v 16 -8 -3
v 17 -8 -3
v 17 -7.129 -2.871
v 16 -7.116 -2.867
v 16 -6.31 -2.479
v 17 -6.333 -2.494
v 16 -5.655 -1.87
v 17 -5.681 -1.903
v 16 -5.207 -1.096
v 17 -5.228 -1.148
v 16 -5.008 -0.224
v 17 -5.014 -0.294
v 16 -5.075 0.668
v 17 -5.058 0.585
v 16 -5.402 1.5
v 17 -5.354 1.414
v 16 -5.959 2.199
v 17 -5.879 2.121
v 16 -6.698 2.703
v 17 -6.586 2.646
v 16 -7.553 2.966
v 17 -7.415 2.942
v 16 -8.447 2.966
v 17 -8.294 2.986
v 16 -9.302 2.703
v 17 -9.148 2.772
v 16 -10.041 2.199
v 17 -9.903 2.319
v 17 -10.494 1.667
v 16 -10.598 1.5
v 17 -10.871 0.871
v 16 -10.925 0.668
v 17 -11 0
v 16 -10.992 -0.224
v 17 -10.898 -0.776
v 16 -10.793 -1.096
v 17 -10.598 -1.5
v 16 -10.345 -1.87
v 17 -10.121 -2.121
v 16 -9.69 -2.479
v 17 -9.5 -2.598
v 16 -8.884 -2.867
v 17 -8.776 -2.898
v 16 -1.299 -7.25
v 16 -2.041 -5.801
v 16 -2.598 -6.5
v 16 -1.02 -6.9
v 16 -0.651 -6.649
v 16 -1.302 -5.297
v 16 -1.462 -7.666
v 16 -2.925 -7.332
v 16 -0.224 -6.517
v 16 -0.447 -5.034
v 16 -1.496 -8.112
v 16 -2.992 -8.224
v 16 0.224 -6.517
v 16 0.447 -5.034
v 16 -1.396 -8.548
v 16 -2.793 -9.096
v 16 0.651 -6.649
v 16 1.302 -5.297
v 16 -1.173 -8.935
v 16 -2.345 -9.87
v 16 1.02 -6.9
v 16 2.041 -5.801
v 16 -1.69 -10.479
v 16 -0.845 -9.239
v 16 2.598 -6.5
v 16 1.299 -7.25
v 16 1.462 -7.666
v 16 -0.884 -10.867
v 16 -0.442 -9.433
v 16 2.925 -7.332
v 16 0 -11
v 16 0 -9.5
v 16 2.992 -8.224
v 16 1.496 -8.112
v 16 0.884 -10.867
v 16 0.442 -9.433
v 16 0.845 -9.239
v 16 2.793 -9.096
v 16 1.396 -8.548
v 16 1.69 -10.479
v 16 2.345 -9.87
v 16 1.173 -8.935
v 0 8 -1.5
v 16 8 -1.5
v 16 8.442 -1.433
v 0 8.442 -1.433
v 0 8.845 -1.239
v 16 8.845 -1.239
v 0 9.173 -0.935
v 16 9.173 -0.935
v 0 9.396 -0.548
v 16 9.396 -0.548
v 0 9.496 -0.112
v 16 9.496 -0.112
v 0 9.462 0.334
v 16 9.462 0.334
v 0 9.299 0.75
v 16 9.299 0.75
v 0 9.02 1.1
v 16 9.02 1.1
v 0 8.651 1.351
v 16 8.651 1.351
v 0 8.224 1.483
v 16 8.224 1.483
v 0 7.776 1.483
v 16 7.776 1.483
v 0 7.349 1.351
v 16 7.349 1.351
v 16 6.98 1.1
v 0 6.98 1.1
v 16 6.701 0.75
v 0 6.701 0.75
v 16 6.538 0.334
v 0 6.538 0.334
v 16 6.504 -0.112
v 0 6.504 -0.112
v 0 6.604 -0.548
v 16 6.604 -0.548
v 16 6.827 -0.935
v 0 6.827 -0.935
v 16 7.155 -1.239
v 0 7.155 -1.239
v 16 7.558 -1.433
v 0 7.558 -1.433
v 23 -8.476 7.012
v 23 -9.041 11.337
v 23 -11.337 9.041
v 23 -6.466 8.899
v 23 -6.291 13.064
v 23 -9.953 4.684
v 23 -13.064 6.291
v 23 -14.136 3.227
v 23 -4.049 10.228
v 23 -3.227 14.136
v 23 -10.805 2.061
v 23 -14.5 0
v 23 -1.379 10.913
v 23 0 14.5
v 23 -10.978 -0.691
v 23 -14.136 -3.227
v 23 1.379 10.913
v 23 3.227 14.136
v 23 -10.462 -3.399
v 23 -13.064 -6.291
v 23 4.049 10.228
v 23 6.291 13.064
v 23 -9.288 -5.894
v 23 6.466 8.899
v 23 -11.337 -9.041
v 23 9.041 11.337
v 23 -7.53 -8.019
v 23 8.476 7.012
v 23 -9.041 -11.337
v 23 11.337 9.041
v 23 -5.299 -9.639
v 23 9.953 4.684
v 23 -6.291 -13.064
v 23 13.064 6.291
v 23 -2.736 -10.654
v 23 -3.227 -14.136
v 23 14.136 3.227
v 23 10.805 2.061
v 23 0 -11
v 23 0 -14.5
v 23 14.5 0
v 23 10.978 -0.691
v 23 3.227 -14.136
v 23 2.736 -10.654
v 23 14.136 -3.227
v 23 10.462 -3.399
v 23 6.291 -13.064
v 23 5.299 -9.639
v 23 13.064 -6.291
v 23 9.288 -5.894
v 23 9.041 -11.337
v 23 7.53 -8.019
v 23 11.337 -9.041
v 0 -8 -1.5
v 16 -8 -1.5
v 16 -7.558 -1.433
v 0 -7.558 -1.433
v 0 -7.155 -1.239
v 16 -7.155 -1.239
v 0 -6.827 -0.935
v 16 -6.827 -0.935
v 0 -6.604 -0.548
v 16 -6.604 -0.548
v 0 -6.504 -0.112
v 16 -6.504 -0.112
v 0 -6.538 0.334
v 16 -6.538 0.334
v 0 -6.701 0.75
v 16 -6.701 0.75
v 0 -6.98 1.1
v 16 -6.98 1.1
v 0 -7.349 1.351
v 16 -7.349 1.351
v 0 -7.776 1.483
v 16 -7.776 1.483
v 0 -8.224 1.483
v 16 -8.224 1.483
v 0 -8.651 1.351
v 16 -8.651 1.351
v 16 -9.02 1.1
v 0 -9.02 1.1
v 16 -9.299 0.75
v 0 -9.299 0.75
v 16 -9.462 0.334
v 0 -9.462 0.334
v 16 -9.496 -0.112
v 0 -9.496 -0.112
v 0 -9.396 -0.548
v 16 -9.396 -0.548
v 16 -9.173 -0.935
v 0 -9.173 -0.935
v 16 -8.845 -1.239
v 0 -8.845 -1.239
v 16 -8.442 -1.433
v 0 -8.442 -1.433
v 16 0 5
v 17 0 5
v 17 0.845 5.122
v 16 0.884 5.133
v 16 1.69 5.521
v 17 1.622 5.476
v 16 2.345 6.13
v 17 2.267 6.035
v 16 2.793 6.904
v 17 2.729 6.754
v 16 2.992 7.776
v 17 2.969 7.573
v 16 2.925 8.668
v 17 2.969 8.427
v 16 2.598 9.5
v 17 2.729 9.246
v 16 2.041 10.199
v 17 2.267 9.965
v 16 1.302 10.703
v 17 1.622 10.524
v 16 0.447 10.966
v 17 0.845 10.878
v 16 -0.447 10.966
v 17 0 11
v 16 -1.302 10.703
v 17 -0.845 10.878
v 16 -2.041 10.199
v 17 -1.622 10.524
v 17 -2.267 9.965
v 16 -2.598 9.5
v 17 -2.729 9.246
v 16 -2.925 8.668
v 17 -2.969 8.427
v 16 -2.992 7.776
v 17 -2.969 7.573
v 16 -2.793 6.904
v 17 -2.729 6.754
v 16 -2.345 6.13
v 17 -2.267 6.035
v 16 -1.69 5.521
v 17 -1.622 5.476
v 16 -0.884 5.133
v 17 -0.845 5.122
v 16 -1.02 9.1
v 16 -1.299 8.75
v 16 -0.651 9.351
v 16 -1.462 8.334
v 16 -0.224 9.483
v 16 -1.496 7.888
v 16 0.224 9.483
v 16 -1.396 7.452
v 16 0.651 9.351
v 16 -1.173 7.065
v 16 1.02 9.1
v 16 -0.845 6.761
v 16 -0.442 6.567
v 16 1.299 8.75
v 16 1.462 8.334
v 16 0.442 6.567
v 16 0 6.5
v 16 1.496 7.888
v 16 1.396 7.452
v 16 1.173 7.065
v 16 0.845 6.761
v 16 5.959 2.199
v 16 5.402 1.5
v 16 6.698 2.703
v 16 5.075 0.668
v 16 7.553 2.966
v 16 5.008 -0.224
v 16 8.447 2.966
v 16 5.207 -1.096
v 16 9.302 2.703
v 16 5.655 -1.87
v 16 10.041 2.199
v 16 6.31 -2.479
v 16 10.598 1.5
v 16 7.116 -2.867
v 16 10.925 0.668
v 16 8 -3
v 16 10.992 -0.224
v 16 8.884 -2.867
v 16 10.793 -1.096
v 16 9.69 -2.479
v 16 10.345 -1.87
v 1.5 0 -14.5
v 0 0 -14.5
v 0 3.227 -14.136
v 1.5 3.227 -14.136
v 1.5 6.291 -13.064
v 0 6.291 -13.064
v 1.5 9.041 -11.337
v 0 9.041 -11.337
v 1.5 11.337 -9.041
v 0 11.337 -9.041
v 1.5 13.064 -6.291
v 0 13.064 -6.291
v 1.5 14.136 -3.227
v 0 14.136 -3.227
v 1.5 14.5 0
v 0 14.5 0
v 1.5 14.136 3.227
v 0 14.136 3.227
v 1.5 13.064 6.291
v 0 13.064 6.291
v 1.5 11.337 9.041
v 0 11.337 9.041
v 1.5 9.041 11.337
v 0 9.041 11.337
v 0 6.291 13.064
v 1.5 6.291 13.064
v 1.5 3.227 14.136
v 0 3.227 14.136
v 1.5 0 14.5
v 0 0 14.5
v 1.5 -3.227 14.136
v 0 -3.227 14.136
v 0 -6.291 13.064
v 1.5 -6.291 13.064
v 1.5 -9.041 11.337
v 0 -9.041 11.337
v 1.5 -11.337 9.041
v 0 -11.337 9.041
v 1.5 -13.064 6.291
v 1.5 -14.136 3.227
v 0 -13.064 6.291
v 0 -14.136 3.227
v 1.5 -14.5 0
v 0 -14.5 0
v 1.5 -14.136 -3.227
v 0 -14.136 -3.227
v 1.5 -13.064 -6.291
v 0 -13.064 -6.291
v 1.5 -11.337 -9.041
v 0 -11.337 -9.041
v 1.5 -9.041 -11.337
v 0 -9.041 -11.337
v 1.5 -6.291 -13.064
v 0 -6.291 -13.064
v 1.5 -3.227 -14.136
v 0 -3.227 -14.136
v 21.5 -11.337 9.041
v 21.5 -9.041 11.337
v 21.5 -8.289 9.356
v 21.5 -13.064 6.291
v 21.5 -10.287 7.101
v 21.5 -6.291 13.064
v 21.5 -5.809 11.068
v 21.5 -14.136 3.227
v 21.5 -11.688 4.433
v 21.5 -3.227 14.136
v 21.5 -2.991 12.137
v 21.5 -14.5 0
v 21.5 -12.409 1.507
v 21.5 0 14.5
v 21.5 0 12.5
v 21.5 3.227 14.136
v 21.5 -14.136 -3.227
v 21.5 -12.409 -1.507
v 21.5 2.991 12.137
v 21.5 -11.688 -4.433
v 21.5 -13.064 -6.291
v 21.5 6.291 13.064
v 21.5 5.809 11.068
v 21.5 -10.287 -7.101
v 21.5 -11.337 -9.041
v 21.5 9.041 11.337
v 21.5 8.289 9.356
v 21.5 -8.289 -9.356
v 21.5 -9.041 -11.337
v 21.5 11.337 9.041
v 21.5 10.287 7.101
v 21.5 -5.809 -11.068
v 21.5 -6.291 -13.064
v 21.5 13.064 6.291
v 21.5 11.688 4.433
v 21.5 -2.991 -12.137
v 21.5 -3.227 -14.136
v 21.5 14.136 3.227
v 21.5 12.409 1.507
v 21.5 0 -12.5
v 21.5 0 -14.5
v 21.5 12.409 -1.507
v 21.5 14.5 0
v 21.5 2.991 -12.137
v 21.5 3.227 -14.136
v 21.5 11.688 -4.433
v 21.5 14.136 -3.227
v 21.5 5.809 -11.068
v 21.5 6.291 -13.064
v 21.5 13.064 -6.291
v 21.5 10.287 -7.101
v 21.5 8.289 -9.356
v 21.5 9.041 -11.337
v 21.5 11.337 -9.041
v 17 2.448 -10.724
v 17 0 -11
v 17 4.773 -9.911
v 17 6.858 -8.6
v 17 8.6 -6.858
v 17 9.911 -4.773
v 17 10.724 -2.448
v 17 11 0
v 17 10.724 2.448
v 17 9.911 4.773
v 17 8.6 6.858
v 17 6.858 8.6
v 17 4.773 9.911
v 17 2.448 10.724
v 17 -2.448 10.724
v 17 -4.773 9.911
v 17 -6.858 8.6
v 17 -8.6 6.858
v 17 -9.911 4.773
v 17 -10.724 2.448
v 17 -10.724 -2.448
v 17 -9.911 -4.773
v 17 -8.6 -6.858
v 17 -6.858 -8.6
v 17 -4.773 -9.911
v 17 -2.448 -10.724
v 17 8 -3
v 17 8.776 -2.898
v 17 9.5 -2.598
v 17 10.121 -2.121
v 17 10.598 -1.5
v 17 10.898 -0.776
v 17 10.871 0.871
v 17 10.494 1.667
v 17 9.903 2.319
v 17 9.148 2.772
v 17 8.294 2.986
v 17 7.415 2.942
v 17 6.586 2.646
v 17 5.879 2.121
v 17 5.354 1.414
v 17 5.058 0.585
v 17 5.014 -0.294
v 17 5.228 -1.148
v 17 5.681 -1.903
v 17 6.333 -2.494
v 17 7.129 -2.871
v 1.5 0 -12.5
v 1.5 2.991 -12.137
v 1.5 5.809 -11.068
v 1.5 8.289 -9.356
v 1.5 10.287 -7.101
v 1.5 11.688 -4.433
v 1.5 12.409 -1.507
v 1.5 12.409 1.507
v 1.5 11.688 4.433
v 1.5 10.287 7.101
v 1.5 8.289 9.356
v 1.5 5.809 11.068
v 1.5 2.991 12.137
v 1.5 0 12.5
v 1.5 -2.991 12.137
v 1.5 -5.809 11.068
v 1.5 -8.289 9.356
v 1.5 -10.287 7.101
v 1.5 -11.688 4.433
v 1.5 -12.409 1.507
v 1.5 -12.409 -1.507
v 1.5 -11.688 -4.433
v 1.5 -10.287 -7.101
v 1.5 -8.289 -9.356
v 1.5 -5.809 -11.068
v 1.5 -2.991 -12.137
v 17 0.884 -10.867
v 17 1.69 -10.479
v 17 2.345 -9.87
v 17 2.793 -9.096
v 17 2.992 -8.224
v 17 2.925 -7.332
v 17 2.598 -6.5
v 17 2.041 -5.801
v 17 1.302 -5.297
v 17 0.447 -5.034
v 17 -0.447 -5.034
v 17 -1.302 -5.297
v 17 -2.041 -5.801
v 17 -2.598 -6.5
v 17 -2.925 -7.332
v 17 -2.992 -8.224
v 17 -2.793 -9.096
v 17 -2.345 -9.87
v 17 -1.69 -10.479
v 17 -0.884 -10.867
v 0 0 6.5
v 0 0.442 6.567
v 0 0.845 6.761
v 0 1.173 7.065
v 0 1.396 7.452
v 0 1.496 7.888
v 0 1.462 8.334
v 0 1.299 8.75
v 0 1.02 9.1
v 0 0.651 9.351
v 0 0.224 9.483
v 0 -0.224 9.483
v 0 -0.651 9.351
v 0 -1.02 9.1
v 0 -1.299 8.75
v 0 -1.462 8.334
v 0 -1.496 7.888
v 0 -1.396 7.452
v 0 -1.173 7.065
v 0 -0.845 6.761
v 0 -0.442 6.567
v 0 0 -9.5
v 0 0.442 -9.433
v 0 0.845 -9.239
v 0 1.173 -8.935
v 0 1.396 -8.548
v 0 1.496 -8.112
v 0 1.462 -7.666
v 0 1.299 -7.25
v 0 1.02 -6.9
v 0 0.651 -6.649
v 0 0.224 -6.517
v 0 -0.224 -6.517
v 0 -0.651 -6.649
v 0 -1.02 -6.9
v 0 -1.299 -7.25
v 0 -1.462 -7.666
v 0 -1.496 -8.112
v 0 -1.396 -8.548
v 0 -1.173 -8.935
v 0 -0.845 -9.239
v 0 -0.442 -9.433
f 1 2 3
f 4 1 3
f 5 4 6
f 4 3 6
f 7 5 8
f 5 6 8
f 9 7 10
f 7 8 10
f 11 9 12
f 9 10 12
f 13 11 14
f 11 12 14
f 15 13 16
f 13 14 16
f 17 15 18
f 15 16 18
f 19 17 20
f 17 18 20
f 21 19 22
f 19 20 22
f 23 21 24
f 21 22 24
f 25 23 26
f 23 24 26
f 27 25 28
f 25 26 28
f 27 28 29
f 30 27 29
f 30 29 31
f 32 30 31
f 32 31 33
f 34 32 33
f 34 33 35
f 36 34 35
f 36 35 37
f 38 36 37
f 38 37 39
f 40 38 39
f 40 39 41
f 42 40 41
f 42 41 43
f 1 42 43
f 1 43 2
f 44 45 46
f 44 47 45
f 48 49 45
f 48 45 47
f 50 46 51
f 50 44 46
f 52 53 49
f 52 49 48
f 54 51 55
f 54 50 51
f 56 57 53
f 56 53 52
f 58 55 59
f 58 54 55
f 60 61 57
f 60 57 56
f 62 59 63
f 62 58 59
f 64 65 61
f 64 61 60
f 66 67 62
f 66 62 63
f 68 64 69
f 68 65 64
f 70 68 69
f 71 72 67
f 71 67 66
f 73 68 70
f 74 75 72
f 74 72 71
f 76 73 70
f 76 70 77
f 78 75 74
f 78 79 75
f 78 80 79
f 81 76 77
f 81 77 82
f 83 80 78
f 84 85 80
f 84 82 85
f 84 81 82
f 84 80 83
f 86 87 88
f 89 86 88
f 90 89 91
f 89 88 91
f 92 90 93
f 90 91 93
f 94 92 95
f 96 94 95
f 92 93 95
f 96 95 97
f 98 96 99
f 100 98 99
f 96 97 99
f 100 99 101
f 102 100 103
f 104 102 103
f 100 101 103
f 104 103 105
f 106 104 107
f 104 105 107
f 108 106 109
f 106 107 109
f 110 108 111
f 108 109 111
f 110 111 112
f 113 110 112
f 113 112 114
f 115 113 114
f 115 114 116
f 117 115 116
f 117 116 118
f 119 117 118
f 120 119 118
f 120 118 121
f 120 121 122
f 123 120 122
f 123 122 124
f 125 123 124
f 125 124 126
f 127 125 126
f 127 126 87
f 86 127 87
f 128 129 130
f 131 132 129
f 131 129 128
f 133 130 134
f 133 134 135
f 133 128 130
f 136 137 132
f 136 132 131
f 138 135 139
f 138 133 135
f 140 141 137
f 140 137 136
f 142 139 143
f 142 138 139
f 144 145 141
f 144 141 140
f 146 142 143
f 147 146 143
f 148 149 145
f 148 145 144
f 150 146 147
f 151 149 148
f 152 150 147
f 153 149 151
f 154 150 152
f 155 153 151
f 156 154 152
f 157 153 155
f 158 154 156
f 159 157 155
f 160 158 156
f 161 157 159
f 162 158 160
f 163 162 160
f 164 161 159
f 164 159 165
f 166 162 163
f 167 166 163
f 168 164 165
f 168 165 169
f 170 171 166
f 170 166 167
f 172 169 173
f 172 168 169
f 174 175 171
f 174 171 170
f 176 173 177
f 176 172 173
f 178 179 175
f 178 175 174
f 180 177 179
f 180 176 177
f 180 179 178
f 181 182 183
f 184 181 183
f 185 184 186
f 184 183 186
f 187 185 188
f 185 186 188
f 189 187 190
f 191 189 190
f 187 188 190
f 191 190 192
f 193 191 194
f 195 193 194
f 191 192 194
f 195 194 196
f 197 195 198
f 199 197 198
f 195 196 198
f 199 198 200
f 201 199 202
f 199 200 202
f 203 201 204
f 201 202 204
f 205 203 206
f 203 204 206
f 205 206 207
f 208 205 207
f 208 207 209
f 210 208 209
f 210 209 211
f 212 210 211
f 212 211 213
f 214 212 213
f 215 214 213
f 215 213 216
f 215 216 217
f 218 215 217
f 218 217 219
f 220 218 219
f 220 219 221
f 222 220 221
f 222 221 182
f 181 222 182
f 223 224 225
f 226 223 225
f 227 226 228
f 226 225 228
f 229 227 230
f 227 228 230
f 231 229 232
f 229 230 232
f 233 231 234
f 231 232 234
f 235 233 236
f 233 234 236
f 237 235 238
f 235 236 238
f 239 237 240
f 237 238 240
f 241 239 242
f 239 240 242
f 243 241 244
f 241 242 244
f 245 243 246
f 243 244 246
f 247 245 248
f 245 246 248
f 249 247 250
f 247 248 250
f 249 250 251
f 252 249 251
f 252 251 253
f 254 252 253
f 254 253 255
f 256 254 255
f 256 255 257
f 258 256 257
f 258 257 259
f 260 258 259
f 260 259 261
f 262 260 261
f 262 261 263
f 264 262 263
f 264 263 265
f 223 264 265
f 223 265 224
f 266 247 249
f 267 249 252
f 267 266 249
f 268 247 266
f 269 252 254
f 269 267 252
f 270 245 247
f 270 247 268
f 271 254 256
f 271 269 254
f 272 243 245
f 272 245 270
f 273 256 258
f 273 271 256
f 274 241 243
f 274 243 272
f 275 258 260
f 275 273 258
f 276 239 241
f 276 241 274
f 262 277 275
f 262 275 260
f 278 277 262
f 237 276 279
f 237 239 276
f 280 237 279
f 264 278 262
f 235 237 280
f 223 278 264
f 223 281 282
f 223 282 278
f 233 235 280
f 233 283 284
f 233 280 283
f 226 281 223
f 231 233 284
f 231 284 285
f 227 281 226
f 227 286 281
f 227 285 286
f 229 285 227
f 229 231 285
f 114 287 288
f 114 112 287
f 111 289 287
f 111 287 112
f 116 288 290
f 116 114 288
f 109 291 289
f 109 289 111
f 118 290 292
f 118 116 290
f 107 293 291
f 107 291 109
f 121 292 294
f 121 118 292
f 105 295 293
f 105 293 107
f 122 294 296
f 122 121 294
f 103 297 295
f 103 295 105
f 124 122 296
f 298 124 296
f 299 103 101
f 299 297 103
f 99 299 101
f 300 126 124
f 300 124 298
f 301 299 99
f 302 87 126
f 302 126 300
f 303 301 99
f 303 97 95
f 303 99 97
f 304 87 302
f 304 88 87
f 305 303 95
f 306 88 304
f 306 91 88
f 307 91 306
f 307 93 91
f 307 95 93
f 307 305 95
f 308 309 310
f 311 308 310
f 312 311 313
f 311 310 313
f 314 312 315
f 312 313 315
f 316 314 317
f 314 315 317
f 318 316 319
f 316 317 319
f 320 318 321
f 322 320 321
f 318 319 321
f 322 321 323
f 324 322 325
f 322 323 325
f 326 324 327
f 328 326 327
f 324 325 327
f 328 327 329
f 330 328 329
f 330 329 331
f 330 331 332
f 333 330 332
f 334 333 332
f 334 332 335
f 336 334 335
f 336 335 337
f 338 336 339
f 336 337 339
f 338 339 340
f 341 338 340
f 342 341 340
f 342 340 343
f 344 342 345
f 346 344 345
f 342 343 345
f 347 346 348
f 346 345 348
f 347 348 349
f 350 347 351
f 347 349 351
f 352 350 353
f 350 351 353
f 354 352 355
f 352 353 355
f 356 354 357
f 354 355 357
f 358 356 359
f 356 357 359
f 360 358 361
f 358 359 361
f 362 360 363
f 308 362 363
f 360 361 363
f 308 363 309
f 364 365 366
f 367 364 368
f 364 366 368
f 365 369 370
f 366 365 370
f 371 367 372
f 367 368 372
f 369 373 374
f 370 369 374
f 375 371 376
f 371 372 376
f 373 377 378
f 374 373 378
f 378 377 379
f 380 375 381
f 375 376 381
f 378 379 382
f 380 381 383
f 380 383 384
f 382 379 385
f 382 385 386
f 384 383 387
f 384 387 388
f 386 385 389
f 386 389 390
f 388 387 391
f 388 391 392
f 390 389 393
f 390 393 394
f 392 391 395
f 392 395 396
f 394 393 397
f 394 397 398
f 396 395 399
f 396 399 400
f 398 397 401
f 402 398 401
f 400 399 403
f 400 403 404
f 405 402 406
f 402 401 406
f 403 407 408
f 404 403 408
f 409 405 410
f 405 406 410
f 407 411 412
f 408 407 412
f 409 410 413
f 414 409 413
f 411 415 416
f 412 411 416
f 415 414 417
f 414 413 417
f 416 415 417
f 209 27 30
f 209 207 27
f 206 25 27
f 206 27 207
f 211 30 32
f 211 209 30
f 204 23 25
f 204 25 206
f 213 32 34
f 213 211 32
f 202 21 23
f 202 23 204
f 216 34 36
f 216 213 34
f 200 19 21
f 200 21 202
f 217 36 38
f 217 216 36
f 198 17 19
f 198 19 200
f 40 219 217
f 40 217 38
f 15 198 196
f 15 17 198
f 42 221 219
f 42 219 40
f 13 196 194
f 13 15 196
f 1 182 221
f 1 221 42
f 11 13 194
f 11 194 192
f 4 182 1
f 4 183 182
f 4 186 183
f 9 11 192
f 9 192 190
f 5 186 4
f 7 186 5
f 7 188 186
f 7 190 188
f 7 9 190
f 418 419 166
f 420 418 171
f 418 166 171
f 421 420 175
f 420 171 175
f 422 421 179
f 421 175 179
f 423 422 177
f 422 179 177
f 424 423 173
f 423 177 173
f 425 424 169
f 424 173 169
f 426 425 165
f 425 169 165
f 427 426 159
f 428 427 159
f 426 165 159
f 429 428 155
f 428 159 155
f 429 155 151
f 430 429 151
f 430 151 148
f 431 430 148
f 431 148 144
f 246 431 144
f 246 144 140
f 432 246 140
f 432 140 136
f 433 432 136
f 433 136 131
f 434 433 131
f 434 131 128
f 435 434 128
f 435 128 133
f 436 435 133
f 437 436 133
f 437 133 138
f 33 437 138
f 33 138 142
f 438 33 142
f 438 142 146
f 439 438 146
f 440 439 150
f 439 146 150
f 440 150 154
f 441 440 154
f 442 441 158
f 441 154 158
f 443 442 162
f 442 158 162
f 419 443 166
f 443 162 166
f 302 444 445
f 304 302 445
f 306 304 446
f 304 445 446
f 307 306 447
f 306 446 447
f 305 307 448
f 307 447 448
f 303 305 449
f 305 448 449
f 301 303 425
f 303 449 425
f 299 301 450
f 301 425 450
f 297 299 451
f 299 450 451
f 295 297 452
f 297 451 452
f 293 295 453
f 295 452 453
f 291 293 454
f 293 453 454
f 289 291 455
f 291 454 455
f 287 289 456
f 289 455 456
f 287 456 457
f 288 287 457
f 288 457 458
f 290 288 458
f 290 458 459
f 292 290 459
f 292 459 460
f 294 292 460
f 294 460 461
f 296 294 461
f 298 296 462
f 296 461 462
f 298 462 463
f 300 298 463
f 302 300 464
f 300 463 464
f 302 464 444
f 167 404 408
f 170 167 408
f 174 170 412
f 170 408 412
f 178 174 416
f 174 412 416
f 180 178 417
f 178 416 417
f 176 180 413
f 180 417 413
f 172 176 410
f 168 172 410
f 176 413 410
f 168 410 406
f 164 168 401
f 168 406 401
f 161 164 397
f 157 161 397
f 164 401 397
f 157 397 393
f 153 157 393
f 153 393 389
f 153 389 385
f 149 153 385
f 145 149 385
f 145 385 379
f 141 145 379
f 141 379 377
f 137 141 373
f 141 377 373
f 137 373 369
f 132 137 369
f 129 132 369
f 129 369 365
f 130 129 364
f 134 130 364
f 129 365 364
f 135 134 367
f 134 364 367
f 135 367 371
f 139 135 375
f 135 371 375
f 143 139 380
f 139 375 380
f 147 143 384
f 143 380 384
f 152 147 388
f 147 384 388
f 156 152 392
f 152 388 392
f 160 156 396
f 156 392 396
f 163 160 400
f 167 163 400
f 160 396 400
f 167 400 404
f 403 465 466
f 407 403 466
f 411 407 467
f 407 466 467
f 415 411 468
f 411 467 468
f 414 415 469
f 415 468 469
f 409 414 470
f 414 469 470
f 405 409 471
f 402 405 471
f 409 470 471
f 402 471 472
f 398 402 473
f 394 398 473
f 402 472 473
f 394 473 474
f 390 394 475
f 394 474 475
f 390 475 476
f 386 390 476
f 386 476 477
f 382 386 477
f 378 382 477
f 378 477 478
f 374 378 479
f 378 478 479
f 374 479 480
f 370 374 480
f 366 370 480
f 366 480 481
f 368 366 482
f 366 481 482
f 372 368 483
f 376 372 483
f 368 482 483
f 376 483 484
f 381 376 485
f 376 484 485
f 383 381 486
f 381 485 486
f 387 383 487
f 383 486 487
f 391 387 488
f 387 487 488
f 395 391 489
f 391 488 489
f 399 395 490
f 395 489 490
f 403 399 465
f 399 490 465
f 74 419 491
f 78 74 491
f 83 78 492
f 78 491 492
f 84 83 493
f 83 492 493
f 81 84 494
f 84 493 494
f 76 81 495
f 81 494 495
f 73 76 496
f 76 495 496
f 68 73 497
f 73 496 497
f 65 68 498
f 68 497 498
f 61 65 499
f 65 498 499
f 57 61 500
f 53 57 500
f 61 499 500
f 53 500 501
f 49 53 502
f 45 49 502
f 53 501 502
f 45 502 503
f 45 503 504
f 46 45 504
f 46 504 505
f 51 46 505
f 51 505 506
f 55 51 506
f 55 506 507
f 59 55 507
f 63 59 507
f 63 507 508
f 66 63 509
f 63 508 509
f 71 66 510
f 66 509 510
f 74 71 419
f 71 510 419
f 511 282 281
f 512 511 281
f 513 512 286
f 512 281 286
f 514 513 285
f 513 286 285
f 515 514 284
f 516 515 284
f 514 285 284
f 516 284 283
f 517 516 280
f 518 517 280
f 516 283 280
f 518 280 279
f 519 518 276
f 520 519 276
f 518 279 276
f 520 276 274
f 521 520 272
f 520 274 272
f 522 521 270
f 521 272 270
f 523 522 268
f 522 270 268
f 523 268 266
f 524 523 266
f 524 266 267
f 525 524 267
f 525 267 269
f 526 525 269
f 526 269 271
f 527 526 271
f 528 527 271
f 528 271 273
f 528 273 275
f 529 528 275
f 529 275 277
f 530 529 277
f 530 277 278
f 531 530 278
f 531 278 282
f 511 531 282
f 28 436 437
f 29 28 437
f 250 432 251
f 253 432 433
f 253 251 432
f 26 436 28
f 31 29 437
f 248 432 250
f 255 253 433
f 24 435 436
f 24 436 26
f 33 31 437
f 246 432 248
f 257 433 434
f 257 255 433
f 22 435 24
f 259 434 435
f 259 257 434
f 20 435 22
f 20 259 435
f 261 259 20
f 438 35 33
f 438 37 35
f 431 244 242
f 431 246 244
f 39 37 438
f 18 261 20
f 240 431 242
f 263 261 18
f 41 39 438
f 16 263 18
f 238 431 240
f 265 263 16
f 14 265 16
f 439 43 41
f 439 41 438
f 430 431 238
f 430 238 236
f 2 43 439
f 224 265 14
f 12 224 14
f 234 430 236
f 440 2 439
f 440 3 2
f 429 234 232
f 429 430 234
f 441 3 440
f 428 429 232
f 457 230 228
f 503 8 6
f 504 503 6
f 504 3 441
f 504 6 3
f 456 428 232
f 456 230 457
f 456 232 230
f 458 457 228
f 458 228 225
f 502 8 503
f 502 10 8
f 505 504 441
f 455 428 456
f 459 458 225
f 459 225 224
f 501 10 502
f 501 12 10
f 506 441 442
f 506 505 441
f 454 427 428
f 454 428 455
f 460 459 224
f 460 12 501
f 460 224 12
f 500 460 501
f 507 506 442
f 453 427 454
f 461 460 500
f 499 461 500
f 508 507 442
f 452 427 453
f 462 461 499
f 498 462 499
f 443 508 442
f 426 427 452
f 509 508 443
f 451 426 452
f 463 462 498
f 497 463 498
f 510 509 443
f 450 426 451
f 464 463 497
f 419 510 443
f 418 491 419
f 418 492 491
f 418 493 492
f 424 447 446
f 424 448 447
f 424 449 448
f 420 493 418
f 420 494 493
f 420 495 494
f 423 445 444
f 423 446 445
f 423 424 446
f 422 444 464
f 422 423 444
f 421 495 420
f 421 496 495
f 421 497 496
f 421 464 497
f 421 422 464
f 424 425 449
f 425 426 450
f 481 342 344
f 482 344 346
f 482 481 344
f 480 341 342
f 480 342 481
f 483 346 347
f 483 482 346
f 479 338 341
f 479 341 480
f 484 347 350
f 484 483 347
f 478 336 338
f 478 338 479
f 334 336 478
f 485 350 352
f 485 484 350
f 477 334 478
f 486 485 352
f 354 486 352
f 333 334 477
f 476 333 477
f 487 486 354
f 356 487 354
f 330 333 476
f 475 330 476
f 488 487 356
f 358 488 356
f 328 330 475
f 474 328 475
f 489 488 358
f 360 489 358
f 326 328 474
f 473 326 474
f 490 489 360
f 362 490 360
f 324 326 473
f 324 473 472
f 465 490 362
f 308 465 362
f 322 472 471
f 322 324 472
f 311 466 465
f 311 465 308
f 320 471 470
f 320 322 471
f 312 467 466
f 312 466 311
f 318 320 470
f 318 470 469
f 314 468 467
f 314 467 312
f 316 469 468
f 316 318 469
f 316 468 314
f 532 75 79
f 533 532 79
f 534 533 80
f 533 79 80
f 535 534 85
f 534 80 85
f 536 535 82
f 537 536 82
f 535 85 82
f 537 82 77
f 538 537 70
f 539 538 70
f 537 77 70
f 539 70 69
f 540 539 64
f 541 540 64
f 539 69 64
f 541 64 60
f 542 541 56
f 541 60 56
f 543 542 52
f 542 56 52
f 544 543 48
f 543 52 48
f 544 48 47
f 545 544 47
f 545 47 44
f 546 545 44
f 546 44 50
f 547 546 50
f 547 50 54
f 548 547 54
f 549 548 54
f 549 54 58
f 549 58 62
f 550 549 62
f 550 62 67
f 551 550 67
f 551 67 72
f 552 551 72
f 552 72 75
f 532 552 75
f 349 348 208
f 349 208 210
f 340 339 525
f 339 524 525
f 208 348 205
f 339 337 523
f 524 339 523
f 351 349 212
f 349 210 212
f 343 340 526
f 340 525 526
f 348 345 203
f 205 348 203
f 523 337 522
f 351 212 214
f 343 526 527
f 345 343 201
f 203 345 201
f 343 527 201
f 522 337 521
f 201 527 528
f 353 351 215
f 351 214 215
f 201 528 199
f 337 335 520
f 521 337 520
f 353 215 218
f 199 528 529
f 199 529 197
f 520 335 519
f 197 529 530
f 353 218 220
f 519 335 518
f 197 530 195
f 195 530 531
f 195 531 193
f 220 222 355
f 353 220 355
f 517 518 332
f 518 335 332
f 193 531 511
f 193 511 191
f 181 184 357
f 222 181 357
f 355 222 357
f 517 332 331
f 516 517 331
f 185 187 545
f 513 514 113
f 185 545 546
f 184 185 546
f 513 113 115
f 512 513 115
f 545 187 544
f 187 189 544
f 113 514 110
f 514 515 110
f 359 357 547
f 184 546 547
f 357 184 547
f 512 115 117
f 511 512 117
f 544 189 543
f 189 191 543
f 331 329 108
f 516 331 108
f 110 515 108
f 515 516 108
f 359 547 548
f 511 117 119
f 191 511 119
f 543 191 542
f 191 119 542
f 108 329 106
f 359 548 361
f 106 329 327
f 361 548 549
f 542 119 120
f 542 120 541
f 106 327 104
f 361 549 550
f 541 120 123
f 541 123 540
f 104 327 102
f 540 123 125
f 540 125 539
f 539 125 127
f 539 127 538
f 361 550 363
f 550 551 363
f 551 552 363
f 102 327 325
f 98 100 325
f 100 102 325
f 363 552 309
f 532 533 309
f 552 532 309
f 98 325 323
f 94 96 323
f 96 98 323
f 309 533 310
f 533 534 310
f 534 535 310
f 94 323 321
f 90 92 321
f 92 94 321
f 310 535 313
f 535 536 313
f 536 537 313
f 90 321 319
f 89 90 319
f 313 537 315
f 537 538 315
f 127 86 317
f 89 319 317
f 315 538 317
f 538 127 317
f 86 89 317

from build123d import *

# Parameters (mm, degrees)
SKETCH1_R           = 14.5
BOSS_EXTRUDE1_DEPTH = 1.5
SKETCH2_R           = 12.5
BOSS_EXTRUDE2_DEPTH = 20
SKETCH3_R           = 14.5
BOSS_EXTRUDE3_DEPTH = 1.5
SKETCH4_R           = 11
CUT_EXTRUDE1_DEPTH  = 6
SKETCH5_R           = 1.5
CUT_EXTRUDE2_DEPTH  = 17
SKETCH6_R           = 3
CUT_EXTRUDE3_DEPTH  = 1


with BuildPart() as part:
    # Sketch1 → Boss-Extrude1 (new body)
    with BuildSketch(Plane(origin=(0, 0, 0), x_dir=(0, 0, -1), z_dir=(1, 0, 0))):
        Circle(SKETCH1_R)
    extrude(amount=BOSS_EXTRUDE1_DEPTH)

    # Sketch2 → Boss-Extrude2 (add)
    with BuildSketch(Plane(origin=(1.5, 0, 0), x_dir=(0, 0, -1), z_dir=(1, 0, 0))):
        Circle(SKETCH2_R)
    extrude(amount=BOSS_EXTRUDE2_DEPTH)

    # Sketch3 → Boss-Extrude3 (add)
    with BuildSketch(Plane(origin=(21.5, 0, 0), x_dir=(0, 0, -1), z_dir=(1, 0, 0))):
        Circle(SKETCH3_R)
    extrude(amount=BOSS_EXTRUDE3_DEPTH)

    # Sketch4 → Cut-Extrude1 (cut)
    with BuildSketch(Plane(origin=(23, 0, 0), x_dir=(0, 0, -1), z_dir=(1, 0, 0))):
        Circle(SKETCH4_R)
    extrude(amount=-CUT_EXTRUDE1_DEPTH, mode=Mode.SUBTRACT)

    # Sketch5 → Cut-Extrude2 (cut)
    with BuildSketch(Plane(origin=(17, 0, 0), x_dir=(0, 0, -1), z_dir=(1, 0, 0))):
        with Locations((0, 8)):
            Circle(SKETCH5_R)
        with Locations((8, 0)):
            Circle(SKETCH5_R)
        with Locations((0, -8)):
            Circle(SKETCH5_R)
        with Locations((-8, 0)):
            Circle(SKETCH5_R)
    extrude(amount=-CUT_EXTRUDE2_DEPTH, mode=Mode.SUBTRACT)

    # Sketch6 → Cut-Extrude3 (cut)
    with BuildSketch(Plane(origin=(17, 0, 0), x_dir=(0, 0, -1), z_dir=(1, 0, 0))):
        with Locations((0, 8)):
            Circle(SKETCH6_R)
        with Locations((8, 0)):
            Circle(SKETCH6_R)
        with Locations((0, -8)):
            Circle(SKETCH6_R)
        with Locations((-8, 0)):
            Circle(SKETCH6_R)
    extrude(amount=-CUT_EXTRUDE3_DEPTH, mode=Mode.SUBTRACT)


solid = part.part
